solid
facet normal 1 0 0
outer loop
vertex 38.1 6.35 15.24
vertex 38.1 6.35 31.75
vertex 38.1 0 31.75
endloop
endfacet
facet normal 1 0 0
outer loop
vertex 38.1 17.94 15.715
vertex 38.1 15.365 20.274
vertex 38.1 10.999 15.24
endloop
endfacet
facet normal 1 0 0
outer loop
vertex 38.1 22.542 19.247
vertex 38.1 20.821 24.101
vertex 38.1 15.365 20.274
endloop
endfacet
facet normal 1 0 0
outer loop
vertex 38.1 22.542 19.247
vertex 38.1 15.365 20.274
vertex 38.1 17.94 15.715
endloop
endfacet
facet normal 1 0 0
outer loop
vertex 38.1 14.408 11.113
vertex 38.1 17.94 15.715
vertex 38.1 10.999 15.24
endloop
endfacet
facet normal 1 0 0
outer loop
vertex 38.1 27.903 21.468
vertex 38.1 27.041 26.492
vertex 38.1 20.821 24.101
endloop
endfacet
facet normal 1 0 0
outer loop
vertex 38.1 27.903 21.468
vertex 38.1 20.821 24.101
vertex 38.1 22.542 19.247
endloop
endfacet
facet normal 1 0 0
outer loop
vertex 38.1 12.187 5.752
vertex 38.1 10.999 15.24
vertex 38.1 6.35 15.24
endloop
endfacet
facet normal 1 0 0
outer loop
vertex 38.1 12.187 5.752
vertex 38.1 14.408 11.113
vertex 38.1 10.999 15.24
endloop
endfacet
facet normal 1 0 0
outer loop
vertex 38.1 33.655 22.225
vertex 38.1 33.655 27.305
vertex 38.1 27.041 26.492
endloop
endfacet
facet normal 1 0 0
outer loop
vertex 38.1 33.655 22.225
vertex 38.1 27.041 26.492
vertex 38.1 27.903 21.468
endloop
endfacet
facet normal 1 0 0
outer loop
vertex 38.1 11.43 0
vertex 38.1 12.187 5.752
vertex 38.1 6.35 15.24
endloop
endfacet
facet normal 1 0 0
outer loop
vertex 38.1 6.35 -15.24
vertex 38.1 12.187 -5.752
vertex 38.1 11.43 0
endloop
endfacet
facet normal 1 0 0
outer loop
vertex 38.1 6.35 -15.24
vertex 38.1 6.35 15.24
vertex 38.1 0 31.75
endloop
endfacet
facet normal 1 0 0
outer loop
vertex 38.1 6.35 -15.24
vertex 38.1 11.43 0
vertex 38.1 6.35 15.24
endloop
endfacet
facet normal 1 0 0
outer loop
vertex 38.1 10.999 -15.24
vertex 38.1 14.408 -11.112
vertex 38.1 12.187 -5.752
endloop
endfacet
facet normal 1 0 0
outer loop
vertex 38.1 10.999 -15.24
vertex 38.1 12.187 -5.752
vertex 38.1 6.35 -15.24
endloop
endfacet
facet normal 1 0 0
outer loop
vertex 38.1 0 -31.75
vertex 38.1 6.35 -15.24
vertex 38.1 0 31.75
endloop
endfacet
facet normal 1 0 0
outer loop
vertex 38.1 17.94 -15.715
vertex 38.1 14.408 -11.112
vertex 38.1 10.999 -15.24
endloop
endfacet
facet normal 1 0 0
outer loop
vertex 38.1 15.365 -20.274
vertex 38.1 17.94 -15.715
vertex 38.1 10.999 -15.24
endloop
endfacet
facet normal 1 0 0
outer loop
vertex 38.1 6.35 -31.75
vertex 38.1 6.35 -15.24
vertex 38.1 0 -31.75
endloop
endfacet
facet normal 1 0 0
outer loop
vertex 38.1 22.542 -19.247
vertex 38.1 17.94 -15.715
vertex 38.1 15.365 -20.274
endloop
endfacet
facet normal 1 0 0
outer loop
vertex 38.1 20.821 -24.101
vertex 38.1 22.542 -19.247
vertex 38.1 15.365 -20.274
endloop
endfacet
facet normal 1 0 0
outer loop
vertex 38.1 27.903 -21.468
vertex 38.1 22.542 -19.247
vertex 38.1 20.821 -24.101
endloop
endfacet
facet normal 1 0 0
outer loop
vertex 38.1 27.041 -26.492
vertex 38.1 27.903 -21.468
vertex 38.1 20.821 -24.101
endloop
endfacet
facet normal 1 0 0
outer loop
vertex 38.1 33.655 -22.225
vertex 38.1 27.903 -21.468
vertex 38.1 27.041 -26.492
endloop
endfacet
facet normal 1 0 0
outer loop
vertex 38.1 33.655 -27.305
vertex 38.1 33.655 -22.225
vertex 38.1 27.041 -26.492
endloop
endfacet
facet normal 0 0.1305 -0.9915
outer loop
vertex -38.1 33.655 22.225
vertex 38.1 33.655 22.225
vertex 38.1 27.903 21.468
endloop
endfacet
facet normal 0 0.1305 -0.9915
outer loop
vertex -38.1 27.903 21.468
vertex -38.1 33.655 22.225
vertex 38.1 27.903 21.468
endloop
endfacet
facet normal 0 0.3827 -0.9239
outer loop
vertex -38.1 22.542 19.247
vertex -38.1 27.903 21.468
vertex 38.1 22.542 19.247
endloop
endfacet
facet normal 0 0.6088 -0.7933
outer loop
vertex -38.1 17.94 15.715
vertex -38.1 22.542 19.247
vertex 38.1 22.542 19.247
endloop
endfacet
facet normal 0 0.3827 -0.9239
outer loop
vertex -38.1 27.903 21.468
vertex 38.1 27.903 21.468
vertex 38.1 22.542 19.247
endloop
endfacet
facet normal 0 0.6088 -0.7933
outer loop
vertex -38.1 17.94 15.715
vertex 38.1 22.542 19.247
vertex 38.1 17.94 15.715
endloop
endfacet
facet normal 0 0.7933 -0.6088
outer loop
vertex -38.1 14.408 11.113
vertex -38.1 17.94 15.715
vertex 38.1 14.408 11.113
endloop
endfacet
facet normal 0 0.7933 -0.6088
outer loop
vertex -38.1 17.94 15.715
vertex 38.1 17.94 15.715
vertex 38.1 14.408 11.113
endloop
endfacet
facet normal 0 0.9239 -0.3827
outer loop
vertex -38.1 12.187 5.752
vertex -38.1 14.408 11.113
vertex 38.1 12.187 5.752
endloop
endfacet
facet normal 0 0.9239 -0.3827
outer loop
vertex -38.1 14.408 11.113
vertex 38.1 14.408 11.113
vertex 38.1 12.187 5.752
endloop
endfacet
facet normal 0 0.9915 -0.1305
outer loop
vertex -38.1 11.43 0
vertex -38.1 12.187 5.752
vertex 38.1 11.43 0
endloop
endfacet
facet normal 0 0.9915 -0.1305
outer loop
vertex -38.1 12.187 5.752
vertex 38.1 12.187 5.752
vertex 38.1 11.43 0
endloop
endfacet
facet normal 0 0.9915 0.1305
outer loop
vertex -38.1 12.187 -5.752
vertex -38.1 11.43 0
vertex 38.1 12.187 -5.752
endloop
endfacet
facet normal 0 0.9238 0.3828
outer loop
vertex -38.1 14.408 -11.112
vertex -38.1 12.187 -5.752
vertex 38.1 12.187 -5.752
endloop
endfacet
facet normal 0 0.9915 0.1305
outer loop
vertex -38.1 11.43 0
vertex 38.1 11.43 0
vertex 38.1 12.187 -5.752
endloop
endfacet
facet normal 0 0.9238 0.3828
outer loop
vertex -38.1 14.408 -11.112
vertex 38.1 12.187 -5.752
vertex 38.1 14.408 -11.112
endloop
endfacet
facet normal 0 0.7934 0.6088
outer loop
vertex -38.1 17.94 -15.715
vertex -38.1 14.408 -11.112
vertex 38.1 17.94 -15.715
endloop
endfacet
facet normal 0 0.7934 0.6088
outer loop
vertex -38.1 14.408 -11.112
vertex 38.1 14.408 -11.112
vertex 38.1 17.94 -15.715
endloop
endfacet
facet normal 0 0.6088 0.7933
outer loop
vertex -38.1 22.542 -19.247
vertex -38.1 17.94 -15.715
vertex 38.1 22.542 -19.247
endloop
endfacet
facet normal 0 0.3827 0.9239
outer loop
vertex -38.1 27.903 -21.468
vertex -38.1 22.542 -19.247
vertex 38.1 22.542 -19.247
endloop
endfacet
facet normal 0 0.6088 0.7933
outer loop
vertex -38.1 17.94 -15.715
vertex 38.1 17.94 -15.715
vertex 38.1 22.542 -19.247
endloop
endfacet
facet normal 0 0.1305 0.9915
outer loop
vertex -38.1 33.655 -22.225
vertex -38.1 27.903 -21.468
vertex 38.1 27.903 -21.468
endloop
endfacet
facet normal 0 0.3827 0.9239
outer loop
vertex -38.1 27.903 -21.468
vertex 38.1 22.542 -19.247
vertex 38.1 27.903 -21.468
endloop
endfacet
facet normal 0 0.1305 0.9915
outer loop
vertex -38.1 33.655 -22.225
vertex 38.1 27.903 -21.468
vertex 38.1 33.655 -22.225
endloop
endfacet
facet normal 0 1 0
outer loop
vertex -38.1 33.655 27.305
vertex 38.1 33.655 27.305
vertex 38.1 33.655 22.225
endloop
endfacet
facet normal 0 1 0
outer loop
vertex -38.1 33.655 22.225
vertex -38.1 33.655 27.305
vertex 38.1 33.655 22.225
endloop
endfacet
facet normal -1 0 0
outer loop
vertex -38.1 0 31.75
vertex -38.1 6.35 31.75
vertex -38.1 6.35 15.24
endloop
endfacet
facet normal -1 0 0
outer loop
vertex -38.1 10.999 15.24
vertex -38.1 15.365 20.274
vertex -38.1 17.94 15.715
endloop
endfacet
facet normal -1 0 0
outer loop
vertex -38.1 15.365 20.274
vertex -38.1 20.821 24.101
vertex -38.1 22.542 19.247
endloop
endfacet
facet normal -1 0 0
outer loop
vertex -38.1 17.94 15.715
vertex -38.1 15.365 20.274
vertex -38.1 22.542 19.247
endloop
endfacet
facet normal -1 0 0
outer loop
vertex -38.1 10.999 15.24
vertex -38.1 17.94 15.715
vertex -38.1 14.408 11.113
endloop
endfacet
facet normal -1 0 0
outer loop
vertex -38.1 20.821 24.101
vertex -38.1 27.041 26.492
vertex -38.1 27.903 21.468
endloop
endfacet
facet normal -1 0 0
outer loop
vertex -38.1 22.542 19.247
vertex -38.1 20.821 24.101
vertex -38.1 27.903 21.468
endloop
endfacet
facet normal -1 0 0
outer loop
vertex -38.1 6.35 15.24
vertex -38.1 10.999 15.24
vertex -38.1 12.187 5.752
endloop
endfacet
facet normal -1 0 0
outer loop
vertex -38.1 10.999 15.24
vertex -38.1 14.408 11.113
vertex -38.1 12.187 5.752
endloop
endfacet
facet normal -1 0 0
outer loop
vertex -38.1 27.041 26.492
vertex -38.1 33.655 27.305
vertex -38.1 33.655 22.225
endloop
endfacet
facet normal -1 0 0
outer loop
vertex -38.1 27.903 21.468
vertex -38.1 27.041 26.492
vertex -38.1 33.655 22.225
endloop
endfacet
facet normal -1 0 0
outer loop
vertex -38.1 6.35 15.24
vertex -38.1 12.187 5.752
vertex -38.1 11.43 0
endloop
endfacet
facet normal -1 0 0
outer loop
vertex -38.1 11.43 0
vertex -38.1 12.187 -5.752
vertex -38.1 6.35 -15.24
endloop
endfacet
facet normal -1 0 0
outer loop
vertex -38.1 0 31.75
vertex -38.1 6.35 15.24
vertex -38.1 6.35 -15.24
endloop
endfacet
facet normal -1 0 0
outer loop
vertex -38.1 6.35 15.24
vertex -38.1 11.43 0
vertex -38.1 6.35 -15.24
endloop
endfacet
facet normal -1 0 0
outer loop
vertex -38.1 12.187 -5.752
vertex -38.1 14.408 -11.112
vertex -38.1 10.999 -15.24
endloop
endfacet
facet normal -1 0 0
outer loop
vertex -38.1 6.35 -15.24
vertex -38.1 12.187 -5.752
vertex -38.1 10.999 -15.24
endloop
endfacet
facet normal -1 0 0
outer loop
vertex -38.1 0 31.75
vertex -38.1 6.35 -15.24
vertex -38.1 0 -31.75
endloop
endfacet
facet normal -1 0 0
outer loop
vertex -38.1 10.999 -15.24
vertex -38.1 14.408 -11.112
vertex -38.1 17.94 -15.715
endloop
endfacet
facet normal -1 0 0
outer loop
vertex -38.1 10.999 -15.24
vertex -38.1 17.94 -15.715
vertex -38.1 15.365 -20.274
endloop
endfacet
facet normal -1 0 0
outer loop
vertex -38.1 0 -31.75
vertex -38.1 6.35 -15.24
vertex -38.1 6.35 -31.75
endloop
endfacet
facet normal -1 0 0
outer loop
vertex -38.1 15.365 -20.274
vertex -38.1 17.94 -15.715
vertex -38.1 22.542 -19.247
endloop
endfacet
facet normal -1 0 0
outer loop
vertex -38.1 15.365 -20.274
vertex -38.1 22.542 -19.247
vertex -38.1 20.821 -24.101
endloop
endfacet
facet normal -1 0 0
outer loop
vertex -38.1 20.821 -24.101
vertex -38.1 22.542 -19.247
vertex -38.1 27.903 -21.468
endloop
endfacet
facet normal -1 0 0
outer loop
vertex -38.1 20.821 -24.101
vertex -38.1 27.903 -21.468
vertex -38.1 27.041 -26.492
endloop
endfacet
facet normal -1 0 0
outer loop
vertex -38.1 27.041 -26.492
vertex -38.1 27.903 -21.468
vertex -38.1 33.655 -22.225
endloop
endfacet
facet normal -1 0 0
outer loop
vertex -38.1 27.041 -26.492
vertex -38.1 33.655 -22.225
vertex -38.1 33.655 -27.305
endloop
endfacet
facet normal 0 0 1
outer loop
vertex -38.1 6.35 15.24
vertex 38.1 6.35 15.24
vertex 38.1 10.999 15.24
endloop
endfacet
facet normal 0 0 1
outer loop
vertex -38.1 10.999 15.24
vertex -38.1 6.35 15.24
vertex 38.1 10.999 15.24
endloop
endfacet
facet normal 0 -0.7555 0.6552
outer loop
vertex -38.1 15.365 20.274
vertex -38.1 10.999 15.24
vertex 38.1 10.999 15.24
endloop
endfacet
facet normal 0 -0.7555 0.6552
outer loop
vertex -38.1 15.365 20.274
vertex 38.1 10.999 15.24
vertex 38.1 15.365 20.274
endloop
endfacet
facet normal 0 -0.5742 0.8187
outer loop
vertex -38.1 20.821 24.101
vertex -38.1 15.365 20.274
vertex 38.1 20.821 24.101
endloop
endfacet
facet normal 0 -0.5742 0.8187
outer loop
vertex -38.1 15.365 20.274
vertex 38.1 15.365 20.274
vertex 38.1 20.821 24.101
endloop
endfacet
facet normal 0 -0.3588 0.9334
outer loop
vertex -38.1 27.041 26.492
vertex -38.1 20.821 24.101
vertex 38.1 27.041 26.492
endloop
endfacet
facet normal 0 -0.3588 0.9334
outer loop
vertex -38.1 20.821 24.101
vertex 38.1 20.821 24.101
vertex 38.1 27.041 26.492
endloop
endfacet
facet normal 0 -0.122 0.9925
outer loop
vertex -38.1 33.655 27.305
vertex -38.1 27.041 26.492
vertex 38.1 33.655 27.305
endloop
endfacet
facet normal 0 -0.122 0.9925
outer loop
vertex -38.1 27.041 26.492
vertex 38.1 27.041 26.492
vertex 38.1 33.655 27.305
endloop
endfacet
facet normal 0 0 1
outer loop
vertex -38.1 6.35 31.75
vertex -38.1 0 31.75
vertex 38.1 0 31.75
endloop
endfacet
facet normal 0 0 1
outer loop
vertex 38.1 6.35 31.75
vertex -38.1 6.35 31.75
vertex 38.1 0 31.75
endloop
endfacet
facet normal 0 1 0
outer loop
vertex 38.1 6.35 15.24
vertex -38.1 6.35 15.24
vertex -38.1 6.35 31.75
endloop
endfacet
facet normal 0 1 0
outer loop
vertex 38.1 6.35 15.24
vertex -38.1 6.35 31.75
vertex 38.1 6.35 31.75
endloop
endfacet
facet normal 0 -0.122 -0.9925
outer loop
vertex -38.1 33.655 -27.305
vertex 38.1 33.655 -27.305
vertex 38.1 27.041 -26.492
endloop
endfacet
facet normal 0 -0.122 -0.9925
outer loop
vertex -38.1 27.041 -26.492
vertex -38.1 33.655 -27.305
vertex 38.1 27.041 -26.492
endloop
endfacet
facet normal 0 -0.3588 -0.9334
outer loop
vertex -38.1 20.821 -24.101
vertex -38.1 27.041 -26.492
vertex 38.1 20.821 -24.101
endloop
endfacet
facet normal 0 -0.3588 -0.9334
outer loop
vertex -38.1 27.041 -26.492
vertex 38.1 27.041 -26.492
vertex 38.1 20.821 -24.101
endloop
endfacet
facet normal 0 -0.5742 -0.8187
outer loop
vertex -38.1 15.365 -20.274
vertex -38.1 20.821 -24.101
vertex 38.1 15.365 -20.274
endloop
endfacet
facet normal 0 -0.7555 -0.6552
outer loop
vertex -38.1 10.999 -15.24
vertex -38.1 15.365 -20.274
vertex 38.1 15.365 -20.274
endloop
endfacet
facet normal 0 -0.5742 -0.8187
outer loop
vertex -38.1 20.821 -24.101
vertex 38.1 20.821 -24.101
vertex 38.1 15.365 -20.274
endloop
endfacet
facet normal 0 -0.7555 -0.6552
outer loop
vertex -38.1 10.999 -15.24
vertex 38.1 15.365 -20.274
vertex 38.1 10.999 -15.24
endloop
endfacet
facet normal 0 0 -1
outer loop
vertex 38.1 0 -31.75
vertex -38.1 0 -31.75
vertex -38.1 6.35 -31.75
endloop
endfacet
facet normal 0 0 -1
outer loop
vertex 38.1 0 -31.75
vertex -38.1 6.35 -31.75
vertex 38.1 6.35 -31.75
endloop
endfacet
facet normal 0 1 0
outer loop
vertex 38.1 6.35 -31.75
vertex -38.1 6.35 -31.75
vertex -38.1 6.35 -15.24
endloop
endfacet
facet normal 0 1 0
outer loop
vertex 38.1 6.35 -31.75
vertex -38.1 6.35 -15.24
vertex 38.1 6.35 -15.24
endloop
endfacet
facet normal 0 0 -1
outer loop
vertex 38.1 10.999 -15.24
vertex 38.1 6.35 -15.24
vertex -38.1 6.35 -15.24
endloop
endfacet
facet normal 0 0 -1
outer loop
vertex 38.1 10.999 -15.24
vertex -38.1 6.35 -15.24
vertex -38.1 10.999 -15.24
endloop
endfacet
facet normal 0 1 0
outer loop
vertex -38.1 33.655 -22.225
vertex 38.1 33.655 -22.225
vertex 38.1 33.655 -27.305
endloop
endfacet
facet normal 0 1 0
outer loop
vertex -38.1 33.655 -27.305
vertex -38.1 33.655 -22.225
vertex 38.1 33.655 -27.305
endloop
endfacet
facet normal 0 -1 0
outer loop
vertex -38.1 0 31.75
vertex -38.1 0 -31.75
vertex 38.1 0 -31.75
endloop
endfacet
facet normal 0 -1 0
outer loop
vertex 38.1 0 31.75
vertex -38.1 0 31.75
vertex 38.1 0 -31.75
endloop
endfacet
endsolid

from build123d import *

# Parameters (mm, degrees)
SKETCH1_W           = 76.2
SKETCH1_H           = 63.5
BOSS_EXTRUDE1_DEPTH = 6.35
BOSS_EXTRUDE2_DEPTH = 76.2
SKETCH3_W           = 30.48
SKETCH3_H           = 4.826
BOSS_EXTRUDE3_DEPTH = 76.2


with BuildPart() as part:
    # Sketch1 → Boss-Extrude1 (new body)
    with BuildSketch(Plane(origin=(0, 0, 0), x_dir=(1, 0, 0), z_dir=(0, 1, 0))):
        Rectangle(SKETCH1_W, SKETCH1_H)
    extrude(amount=BOSS_EXTRUDE1_DEPTH)



with BuildPart() as body_2:
    # Sketch2 → Boss-Extrude2 (new body)
    with BuildSketch(Plane(origin=(38.1, 0, 0), x_dir=(0, 0, -1), z_dir=(1, 0, 0))):
        with BuildLine():
            Line((-27.305, 33.655), (-22.225, 33.655))
            ThreePointArc((-22.225, 33.655), (0, 11.43), (22.225, 33.655))
            Line((22.225, 33.655), (27.305, 33.655))
            ThreePointArc((27.305, 33.655), (0, 6.35), (-27.305, 33.655))
        make_face()
    extrude(amount=-BOSS_EXTRUDE2_DEPTH)


with BuildPart() as part_1:
    add(part.part)

    add(body_2.part)  # Boss-Extrude3 merges body 2
    # Sketch3 → Boss-Extrude3 (add)
    with BuildSketch(Plane(origin=(38.1, 0, 0), x_dir=(0, 0, -1), z_dir=(1, 0, 0))):
        with Locations((0, 8.763)):
            Rectangle(SKETCH3_W, SKETCH3_H)
    extrude(amount=-BOSS_EXTRUDE3_DEPTH)


solid = part_1.part
